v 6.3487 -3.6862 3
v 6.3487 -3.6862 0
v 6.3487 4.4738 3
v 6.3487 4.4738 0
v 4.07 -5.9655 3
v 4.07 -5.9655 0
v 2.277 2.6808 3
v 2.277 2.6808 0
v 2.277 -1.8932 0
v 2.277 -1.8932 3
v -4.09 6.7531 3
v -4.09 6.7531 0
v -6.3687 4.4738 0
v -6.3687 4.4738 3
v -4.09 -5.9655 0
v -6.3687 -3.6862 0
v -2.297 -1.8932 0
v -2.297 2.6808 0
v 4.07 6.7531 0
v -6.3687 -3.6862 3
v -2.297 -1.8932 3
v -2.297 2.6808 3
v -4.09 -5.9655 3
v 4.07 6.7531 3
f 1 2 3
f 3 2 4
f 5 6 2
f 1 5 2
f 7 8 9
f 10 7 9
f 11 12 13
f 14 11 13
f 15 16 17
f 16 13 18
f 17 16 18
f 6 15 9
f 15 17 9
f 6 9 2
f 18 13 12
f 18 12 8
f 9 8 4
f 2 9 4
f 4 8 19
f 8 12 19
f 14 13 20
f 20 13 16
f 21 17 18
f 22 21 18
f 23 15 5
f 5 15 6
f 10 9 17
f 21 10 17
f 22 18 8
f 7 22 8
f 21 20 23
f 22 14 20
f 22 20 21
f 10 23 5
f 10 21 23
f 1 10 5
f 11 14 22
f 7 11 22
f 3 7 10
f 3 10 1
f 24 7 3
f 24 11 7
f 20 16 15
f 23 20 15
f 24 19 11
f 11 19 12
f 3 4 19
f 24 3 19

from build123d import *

# Parameters (mm, degrees)
F1_DEPTH = 3


with BuildPart() as f1:
    # F0 (on Top) → F1 (new body)
    with BuildSketch(Plane.XY):
        Polygon((-2.297005, -1.893192), (-6.368706, -3.686192), (-4.090005, -5.9655), (4.069995, -5.9655), (6.348696, -3.686192), (2.276995, -1.893192), align=None)
        Polygon((6.348696, -3.686192), (6.348696, 4.473808), (2.276995, 2.680808), (2.276995, -1.893192), align=None)
        Polygon((-2.297005, 2.680808), (-6.368706, 4.473808), (-6.368706, -3.686192), (-2.297005, -1.893192), align=None)
        Polygon((4.069995, 6.753117), (-4.090005, 6.753117), (-6.368706, 4.473808), (-2.297005, 2.680808), (2.276995, 2.680808), (6.348696, 4.473808), align=None)
    extrude(amount=F1_DEPTH)


solid = f1.part
